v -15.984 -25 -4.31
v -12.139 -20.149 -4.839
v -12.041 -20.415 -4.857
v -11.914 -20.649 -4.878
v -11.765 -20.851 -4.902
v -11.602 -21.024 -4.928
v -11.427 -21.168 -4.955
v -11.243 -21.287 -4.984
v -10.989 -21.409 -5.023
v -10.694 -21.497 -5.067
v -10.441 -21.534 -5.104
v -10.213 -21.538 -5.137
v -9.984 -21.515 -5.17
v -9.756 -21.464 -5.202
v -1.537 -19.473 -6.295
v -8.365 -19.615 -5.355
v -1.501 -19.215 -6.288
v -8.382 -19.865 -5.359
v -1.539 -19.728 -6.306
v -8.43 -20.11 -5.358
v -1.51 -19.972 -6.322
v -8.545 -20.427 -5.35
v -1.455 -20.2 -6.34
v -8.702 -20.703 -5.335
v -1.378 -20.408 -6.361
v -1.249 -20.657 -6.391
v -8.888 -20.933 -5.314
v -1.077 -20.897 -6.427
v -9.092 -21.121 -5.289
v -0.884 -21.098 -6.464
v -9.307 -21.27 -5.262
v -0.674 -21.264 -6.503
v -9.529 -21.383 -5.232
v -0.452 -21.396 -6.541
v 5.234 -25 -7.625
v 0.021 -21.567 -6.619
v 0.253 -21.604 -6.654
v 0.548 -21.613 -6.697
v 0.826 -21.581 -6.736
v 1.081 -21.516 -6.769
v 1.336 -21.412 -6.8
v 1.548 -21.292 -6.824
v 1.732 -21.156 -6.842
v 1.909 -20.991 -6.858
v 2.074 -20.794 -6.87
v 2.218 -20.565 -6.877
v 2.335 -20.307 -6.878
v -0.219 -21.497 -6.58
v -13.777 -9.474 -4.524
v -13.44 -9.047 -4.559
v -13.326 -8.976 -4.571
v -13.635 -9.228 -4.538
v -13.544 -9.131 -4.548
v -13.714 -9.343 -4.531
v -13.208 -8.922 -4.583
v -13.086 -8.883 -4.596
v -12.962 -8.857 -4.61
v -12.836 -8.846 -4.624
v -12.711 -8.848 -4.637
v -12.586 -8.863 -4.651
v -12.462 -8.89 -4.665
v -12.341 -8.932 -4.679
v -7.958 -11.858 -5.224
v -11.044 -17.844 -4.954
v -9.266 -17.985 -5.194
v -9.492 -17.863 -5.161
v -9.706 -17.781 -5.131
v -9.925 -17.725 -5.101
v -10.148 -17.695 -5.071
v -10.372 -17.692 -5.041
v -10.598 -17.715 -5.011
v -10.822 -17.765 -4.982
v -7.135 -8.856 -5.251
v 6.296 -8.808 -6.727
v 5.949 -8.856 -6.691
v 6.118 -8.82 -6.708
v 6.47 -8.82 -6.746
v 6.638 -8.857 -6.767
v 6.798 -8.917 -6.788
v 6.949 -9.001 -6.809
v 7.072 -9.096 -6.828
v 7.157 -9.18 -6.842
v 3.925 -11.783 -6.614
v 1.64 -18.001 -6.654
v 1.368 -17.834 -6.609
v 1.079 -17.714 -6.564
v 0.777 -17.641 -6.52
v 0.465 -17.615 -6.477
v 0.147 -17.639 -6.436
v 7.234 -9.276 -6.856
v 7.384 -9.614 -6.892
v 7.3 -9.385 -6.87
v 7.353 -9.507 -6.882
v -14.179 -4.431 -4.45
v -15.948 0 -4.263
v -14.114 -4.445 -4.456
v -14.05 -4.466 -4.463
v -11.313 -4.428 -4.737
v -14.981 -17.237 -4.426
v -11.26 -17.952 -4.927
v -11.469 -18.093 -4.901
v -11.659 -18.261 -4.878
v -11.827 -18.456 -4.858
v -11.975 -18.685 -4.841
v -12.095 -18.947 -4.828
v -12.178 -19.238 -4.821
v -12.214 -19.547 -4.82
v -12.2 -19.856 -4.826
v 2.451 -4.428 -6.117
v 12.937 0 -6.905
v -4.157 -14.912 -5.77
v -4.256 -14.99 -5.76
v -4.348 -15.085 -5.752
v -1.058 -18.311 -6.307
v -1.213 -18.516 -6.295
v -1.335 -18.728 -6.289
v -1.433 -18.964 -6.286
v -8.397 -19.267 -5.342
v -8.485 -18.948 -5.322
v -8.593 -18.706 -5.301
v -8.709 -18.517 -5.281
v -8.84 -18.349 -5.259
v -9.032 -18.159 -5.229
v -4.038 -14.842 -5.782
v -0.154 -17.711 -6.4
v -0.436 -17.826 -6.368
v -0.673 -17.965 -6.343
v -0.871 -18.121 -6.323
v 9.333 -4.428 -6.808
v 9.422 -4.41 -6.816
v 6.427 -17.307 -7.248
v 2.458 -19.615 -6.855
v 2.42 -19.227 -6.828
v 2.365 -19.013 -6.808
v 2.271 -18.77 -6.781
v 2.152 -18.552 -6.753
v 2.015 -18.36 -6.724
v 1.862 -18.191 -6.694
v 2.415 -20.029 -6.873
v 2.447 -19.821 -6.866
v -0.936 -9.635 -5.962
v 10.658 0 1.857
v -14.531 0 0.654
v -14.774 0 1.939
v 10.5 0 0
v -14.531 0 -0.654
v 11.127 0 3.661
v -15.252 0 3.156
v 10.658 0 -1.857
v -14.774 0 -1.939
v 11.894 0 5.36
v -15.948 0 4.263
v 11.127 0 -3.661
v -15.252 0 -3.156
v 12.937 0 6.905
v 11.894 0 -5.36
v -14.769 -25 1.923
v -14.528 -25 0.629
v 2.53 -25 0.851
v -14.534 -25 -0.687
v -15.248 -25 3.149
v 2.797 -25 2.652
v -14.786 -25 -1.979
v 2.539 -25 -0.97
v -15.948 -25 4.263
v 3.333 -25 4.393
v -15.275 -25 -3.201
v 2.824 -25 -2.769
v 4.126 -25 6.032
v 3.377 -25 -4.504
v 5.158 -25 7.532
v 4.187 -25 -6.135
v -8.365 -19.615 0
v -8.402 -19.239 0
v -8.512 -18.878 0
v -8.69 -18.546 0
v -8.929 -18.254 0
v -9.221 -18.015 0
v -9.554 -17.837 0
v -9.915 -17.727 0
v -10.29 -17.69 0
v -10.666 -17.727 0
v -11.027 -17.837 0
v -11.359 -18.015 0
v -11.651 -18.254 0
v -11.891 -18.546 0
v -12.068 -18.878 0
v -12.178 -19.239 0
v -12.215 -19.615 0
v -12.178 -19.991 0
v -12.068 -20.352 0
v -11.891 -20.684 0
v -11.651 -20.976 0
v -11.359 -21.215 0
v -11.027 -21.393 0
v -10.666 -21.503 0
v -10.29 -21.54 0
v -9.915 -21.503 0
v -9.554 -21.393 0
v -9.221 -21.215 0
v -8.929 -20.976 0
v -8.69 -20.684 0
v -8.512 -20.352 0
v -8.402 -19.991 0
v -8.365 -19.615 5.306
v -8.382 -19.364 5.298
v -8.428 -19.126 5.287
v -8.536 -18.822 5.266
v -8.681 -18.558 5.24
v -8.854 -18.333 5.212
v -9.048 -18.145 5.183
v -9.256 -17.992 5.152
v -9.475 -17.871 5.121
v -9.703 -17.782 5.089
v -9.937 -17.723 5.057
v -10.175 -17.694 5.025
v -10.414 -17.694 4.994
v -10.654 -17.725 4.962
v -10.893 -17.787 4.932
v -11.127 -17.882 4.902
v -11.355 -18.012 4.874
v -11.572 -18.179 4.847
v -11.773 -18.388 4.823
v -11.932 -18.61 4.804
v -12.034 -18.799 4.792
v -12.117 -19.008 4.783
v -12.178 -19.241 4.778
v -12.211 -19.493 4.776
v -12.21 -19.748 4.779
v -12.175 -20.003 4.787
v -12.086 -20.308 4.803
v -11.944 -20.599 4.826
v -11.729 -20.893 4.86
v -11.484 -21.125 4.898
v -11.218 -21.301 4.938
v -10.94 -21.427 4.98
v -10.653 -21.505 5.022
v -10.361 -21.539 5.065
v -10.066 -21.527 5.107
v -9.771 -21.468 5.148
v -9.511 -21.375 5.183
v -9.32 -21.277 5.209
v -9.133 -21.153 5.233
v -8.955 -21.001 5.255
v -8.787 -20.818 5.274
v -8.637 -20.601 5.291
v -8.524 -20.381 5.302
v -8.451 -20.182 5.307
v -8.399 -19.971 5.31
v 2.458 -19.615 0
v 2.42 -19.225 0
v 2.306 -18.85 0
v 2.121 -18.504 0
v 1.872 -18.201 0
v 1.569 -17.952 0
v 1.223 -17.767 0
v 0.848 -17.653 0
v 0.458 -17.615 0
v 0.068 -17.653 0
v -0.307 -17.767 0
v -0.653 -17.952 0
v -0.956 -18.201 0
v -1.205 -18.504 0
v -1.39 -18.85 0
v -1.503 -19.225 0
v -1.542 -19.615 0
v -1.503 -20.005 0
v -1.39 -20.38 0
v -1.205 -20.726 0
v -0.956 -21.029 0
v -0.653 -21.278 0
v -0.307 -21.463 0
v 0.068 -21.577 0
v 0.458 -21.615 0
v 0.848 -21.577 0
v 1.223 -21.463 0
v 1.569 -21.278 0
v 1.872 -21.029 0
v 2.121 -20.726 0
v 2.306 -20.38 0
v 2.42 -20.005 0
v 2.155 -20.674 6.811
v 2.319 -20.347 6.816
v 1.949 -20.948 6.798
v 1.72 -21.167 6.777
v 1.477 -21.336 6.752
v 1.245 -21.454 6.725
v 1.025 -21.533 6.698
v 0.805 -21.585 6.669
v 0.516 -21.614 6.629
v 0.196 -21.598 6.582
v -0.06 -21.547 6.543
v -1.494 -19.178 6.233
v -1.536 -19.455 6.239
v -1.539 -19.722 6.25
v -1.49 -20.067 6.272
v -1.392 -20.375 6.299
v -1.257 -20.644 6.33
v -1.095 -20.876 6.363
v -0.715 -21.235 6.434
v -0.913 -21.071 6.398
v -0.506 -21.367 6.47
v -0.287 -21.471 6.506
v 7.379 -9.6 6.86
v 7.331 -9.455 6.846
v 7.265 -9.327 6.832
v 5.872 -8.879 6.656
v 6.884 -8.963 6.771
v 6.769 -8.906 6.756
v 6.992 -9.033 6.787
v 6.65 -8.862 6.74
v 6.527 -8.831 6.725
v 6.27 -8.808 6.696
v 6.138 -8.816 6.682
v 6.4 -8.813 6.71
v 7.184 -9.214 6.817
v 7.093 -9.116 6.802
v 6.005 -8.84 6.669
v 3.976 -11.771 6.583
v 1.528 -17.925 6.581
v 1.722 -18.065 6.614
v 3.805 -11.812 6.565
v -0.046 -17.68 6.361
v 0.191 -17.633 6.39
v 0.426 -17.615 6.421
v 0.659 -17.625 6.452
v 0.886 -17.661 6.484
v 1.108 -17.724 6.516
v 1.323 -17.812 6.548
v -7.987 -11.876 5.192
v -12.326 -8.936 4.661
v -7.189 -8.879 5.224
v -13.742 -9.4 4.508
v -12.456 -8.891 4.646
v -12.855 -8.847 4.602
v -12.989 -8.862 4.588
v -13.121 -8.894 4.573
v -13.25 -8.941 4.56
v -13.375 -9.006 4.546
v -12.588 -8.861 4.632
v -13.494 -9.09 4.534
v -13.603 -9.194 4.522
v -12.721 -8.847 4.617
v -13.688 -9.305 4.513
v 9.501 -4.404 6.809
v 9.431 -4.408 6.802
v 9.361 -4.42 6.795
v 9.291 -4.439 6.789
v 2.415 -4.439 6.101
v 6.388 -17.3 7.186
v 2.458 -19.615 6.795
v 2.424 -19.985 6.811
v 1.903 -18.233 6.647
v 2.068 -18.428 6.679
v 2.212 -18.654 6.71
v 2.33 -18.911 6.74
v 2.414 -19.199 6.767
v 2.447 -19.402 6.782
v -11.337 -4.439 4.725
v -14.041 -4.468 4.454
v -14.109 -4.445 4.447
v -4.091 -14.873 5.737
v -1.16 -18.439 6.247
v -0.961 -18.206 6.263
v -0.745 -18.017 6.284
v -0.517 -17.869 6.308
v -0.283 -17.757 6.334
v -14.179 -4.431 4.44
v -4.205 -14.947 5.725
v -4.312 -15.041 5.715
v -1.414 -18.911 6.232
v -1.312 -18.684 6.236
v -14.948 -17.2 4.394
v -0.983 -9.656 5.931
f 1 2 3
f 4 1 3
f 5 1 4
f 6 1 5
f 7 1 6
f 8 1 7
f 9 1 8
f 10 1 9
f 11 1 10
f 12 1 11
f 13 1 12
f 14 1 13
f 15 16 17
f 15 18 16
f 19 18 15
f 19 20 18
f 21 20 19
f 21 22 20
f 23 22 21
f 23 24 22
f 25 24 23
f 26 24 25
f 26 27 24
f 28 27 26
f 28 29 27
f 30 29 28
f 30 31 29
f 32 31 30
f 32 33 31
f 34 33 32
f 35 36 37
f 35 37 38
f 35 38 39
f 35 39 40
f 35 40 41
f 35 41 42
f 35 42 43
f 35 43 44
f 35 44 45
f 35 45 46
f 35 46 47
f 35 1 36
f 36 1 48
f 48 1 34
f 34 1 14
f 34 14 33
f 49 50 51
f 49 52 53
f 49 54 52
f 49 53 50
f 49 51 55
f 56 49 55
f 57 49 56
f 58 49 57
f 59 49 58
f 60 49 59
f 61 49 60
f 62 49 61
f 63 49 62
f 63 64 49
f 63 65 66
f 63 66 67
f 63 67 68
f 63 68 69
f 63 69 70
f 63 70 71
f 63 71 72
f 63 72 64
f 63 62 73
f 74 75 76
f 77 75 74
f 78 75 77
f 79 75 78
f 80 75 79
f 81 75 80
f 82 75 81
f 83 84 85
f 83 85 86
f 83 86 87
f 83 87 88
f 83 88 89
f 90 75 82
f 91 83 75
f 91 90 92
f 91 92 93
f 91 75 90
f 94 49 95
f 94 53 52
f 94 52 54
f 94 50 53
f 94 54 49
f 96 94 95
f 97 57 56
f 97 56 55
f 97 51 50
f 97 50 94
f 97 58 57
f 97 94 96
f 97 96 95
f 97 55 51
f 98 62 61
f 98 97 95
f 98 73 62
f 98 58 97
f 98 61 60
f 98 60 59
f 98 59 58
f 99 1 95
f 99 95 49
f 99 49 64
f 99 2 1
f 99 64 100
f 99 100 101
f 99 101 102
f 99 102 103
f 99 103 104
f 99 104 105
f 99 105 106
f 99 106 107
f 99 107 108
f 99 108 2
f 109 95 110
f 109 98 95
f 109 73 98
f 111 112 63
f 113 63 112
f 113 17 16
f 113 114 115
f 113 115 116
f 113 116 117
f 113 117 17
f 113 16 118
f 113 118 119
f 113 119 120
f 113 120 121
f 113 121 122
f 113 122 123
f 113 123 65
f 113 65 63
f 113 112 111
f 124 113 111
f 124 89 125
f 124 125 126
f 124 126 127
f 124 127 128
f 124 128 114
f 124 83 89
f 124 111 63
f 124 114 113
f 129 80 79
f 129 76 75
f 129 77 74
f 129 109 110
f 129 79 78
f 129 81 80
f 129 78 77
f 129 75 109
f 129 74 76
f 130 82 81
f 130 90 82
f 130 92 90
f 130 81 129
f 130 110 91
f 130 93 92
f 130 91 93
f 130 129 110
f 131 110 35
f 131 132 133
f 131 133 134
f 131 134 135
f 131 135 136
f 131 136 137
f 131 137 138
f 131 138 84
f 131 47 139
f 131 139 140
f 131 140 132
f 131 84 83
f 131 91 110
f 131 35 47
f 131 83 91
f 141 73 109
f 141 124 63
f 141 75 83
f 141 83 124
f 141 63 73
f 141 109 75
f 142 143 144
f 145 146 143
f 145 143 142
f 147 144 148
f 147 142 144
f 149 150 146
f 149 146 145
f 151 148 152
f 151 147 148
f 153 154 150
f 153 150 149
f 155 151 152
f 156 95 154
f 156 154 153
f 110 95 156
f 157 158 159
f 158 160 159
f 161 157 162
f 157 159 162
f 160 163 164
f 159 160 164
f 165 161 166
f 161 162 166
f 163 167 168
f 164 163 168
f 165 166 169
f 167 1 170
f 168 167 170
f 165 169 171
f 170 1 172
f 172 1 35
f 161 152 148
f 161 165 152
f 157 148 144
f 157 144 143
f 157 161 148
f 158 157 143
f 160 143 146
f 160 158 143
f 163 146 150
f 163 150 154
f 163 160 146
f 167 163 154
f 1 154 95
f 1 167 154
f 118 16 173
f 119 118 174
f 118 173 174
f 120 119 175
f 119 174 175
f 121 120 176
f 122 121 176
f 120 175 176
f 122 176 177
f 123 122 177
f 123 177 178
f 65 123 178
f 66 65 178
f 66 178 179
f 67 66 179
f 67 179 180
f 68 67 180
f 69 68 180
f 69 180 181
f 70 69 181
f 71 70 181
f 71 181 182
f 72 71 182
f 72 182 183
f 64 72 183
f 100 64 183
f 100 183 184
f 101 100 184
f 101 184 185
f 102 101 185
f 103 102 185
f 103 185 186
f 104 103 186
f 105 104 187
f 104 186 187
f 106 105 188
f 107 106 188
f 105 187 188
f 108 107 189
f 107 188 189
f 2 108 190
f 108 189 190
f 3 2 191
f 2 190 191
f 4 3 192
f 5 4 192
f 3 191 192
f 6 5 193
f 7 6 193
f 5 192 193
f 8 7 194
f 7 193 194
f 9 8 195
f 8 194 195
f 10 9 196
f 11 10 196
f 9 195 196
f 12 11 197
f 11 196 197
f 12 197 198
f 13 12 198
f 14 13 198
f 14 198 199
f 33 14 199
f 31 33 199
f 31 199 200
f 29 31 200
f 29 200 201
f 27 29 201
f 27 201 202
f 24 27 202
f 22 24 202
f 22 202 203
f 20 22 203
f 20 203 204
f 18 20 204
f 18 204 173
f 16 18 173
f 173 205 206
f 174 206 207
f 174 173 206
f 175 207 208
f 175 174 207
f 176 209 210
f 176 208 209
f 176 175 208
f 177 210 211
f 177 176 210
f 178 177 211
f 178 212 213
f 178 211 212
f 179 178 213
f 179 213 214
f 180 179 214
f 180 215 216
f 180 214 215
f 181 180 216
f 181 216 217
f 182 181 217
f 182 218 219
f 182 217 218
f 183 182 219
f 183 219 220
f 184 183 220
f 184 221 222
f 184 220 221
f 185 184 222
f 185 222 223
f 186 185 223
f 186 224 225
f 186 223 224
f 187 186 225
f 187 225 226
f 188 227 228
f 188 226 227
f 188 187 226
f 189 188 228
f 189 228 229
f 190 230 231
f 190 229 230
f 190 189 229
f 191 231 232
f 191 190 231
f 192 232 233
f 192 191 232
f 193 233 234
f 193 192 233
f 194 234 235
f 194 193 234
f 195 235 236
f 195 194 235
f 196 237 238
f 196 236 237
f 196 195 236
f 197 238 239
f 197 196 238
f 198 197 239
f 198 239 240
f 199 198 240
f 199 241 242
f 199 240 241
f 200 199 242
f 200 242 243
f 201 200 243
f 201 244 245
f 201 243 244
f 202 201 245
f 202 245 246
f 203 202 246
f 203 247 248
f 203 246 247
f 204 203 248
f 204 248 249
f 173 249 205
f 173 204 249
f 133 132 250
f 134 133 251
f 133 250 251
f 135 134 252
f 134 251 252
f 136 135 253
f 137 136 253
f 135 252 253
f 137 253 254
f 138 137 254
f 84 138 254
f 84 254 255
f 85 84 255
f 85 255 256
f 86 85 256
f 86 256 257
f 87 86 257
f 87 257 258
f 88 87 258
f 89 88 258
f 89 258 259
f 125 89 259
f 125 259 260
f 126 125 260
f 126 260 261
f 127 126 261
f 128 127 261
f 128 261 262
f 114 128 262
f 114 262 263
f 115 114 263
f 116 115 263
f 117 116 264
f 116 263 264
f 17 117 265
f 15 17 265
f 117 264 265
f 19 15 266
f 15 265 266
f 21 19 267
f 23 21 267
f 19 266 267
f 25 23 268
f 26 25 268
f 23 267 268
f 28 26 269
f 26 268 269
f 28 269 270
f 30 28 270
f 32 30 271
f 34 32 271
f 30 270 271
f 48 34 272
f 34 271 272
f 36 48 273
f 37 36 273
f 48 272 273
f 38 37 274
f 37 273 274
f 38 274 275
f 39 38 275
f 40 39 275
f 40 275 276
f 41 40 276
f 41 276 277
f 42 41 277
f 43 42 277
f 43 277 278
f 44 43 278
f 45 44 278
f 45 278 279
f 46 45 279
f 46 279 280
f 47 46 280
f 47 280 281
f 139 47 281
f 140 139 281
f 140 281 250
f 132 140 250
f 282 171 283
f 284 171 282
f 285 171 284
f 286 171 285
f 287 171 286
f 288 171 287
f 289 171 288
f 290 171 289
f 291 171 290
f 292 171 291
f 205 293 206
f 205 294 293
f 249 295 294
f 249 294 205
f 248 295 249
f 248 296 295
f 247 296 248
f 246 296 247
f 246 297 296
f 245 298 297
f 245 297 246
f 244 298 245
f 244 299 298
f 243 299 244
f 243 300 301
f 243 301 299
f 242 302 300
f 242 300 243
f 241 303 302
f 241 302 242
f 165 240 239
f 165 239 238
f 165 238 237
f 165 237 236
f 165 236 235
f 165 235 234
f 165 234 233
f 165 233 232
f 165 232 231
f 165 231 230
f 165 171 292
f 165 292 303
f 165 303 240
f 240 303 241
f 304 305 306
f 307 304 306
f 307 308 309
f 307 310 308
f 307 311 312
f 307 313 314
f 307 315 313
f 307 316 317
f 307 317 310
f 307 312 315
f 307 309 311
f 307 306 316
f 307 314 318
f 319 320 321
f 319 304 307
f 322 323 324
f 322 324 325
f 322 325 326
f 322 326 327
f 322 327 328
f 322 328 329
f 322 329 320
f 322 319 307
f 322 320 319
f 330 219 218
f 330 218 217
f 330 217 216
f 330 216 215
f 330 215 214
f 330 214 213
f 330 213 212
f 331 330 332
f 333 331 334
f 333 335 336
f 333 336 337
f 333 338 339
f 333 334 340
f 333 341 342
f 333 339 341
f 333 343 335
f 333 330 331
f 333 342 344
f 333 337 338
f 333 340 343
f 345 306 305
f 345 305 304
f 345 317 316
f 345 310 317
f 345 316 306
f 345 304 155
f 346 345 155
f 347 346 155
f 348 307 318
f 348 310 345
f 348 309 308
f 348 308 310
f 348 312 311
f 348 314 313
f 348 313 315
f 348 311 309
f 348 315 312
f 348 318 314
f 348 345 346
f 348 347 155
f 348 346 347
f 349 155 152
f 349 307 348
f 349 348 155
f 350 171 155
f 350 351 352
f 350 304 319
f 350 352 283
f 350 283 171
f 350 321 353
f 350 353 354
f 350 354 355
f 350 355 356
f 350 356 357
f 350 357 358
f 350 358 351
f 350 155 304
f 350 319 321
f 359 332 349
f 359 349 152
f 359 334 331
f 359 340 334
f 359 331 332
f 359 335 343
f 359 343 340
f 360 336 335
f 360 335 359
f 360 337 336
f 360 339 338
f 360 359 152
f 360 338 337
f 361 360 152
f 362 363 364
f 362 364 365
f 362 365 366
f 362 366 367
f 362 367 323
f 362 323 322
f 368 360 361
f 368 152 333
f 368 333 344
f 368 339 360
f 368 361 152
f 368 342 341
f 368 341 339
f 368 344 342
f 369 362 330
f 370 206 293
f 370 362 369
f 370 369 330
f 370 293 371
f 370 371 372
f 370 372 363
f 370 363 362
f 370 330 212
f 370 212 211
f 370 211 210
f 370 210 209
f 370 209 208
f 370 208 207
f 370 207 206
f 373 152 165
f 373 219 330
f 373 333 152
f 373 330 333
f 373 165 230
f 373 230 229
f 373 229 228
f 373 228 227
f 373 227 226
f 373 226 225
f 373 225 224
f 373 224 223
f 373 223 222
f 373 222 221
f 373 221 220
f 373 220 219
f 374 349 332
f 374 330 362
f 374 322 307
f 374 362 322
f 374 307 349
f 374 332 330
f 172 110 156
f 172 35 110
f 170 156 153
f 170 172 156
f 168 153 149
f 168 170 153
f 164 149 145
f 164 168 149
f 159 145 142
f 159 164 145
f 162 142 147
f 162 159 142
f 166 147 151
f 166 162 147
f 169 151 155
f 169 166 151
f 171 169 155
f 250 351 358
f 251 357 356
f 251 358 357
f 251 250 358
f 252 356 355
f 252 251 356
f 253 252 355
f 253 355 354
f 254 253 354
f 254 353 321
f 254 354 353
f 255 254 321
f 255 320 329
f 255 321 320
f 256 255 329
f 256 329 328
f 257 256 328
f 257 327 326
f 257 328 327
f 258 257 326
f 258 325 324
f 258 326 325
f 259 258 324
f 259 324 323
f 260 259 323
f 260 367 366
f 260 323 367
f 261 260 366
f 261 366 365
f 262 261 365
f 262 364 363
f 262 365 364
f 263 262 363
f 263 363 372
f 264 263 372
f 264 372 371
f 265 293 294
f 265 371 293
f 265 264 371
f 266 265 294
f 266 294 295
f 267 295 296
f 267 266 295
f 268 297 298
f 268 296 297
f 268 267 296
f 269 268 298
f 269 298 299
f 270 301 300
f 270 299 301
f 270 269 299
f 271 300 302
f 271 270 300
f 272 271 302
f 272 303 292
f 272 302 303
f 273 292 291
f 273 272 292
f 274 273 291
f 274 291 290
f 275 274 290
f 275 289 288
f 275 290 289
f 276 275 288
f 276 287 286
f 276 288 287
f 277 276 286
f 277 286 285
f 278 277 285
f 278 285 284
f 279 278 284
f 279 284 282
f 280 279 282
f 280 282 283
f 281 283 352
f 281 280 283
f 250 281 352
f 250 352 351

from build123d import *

# Parameters (mm, degrees)
F1_W          = 5.870015
F1_H          = 6.290437
F2_DEPTH      = 25
F5_R          = 1.924838
F5_R_2        = 2
F6_DEPTH      = 10
F6_DEPTH_BACK = 10


with BuildPart() as f2:
    # F1 (on Front) → F2 (new body)
    with BuildSketch(Plane.XZ):
        with Locations((-3.029539, -0.13159)):
            Rectangle(F1_W, F1_H)
    extrude(amount=F2_DEPTH)

    # F0 (on Front) → F4 section 0
    with BuildSketch(Plane.XZ):
        with BuildLine():
            ThreePointArc((-15.948061, 4.263329), (-14.5, 0), (-15.948061, -4.263329))
            Line((-15.948061, -4.263329), (12.936951, -6.90465))
            ThreePointArc((12.936951, -6.90465), (10.5, 0), (12.936951, 6.90465))
            Line((12.936951, 6.90465), (-15.948061, 4.263329))
        make_face()
    # F3 (on face) → F4 section 1
    with BuildSketch(Plane.XZ.offset(25)):
        with BuildLine():
            ThreePointArc((-15.948061, 4.263329), (-14.500061, -0.029295), (-15.983939, -4.309649))
            Line((-15.983939, -4.309649), (5.2341, -7.625162))
            ThreePointArc((5.2341, -7.625162), (2.500149, -0.059857), (5.158492, 7.532345))
            Line((5.158492, 7.532345), (-15.948061, 4.263329))
        make_face()
    loft()

    # F5 (on Top) → F6 (cut, two sides)
    with BuildSketch(Plane.XY) as f6_sk:
        with Locations((-10.290117, -19.614996)):
            Circle(F5_R)
        with Locations((0.45808, -19.614996)):
            Circle(F5_R_2)
    extrude(amount=F6_DEPTH, mode=Mode.SUBTRACT)
    extrude(f6_sk.sketch, amount=-F6_DEPTH_BACK, mode=Mode.SUBTRACT)


solid = f2.part
